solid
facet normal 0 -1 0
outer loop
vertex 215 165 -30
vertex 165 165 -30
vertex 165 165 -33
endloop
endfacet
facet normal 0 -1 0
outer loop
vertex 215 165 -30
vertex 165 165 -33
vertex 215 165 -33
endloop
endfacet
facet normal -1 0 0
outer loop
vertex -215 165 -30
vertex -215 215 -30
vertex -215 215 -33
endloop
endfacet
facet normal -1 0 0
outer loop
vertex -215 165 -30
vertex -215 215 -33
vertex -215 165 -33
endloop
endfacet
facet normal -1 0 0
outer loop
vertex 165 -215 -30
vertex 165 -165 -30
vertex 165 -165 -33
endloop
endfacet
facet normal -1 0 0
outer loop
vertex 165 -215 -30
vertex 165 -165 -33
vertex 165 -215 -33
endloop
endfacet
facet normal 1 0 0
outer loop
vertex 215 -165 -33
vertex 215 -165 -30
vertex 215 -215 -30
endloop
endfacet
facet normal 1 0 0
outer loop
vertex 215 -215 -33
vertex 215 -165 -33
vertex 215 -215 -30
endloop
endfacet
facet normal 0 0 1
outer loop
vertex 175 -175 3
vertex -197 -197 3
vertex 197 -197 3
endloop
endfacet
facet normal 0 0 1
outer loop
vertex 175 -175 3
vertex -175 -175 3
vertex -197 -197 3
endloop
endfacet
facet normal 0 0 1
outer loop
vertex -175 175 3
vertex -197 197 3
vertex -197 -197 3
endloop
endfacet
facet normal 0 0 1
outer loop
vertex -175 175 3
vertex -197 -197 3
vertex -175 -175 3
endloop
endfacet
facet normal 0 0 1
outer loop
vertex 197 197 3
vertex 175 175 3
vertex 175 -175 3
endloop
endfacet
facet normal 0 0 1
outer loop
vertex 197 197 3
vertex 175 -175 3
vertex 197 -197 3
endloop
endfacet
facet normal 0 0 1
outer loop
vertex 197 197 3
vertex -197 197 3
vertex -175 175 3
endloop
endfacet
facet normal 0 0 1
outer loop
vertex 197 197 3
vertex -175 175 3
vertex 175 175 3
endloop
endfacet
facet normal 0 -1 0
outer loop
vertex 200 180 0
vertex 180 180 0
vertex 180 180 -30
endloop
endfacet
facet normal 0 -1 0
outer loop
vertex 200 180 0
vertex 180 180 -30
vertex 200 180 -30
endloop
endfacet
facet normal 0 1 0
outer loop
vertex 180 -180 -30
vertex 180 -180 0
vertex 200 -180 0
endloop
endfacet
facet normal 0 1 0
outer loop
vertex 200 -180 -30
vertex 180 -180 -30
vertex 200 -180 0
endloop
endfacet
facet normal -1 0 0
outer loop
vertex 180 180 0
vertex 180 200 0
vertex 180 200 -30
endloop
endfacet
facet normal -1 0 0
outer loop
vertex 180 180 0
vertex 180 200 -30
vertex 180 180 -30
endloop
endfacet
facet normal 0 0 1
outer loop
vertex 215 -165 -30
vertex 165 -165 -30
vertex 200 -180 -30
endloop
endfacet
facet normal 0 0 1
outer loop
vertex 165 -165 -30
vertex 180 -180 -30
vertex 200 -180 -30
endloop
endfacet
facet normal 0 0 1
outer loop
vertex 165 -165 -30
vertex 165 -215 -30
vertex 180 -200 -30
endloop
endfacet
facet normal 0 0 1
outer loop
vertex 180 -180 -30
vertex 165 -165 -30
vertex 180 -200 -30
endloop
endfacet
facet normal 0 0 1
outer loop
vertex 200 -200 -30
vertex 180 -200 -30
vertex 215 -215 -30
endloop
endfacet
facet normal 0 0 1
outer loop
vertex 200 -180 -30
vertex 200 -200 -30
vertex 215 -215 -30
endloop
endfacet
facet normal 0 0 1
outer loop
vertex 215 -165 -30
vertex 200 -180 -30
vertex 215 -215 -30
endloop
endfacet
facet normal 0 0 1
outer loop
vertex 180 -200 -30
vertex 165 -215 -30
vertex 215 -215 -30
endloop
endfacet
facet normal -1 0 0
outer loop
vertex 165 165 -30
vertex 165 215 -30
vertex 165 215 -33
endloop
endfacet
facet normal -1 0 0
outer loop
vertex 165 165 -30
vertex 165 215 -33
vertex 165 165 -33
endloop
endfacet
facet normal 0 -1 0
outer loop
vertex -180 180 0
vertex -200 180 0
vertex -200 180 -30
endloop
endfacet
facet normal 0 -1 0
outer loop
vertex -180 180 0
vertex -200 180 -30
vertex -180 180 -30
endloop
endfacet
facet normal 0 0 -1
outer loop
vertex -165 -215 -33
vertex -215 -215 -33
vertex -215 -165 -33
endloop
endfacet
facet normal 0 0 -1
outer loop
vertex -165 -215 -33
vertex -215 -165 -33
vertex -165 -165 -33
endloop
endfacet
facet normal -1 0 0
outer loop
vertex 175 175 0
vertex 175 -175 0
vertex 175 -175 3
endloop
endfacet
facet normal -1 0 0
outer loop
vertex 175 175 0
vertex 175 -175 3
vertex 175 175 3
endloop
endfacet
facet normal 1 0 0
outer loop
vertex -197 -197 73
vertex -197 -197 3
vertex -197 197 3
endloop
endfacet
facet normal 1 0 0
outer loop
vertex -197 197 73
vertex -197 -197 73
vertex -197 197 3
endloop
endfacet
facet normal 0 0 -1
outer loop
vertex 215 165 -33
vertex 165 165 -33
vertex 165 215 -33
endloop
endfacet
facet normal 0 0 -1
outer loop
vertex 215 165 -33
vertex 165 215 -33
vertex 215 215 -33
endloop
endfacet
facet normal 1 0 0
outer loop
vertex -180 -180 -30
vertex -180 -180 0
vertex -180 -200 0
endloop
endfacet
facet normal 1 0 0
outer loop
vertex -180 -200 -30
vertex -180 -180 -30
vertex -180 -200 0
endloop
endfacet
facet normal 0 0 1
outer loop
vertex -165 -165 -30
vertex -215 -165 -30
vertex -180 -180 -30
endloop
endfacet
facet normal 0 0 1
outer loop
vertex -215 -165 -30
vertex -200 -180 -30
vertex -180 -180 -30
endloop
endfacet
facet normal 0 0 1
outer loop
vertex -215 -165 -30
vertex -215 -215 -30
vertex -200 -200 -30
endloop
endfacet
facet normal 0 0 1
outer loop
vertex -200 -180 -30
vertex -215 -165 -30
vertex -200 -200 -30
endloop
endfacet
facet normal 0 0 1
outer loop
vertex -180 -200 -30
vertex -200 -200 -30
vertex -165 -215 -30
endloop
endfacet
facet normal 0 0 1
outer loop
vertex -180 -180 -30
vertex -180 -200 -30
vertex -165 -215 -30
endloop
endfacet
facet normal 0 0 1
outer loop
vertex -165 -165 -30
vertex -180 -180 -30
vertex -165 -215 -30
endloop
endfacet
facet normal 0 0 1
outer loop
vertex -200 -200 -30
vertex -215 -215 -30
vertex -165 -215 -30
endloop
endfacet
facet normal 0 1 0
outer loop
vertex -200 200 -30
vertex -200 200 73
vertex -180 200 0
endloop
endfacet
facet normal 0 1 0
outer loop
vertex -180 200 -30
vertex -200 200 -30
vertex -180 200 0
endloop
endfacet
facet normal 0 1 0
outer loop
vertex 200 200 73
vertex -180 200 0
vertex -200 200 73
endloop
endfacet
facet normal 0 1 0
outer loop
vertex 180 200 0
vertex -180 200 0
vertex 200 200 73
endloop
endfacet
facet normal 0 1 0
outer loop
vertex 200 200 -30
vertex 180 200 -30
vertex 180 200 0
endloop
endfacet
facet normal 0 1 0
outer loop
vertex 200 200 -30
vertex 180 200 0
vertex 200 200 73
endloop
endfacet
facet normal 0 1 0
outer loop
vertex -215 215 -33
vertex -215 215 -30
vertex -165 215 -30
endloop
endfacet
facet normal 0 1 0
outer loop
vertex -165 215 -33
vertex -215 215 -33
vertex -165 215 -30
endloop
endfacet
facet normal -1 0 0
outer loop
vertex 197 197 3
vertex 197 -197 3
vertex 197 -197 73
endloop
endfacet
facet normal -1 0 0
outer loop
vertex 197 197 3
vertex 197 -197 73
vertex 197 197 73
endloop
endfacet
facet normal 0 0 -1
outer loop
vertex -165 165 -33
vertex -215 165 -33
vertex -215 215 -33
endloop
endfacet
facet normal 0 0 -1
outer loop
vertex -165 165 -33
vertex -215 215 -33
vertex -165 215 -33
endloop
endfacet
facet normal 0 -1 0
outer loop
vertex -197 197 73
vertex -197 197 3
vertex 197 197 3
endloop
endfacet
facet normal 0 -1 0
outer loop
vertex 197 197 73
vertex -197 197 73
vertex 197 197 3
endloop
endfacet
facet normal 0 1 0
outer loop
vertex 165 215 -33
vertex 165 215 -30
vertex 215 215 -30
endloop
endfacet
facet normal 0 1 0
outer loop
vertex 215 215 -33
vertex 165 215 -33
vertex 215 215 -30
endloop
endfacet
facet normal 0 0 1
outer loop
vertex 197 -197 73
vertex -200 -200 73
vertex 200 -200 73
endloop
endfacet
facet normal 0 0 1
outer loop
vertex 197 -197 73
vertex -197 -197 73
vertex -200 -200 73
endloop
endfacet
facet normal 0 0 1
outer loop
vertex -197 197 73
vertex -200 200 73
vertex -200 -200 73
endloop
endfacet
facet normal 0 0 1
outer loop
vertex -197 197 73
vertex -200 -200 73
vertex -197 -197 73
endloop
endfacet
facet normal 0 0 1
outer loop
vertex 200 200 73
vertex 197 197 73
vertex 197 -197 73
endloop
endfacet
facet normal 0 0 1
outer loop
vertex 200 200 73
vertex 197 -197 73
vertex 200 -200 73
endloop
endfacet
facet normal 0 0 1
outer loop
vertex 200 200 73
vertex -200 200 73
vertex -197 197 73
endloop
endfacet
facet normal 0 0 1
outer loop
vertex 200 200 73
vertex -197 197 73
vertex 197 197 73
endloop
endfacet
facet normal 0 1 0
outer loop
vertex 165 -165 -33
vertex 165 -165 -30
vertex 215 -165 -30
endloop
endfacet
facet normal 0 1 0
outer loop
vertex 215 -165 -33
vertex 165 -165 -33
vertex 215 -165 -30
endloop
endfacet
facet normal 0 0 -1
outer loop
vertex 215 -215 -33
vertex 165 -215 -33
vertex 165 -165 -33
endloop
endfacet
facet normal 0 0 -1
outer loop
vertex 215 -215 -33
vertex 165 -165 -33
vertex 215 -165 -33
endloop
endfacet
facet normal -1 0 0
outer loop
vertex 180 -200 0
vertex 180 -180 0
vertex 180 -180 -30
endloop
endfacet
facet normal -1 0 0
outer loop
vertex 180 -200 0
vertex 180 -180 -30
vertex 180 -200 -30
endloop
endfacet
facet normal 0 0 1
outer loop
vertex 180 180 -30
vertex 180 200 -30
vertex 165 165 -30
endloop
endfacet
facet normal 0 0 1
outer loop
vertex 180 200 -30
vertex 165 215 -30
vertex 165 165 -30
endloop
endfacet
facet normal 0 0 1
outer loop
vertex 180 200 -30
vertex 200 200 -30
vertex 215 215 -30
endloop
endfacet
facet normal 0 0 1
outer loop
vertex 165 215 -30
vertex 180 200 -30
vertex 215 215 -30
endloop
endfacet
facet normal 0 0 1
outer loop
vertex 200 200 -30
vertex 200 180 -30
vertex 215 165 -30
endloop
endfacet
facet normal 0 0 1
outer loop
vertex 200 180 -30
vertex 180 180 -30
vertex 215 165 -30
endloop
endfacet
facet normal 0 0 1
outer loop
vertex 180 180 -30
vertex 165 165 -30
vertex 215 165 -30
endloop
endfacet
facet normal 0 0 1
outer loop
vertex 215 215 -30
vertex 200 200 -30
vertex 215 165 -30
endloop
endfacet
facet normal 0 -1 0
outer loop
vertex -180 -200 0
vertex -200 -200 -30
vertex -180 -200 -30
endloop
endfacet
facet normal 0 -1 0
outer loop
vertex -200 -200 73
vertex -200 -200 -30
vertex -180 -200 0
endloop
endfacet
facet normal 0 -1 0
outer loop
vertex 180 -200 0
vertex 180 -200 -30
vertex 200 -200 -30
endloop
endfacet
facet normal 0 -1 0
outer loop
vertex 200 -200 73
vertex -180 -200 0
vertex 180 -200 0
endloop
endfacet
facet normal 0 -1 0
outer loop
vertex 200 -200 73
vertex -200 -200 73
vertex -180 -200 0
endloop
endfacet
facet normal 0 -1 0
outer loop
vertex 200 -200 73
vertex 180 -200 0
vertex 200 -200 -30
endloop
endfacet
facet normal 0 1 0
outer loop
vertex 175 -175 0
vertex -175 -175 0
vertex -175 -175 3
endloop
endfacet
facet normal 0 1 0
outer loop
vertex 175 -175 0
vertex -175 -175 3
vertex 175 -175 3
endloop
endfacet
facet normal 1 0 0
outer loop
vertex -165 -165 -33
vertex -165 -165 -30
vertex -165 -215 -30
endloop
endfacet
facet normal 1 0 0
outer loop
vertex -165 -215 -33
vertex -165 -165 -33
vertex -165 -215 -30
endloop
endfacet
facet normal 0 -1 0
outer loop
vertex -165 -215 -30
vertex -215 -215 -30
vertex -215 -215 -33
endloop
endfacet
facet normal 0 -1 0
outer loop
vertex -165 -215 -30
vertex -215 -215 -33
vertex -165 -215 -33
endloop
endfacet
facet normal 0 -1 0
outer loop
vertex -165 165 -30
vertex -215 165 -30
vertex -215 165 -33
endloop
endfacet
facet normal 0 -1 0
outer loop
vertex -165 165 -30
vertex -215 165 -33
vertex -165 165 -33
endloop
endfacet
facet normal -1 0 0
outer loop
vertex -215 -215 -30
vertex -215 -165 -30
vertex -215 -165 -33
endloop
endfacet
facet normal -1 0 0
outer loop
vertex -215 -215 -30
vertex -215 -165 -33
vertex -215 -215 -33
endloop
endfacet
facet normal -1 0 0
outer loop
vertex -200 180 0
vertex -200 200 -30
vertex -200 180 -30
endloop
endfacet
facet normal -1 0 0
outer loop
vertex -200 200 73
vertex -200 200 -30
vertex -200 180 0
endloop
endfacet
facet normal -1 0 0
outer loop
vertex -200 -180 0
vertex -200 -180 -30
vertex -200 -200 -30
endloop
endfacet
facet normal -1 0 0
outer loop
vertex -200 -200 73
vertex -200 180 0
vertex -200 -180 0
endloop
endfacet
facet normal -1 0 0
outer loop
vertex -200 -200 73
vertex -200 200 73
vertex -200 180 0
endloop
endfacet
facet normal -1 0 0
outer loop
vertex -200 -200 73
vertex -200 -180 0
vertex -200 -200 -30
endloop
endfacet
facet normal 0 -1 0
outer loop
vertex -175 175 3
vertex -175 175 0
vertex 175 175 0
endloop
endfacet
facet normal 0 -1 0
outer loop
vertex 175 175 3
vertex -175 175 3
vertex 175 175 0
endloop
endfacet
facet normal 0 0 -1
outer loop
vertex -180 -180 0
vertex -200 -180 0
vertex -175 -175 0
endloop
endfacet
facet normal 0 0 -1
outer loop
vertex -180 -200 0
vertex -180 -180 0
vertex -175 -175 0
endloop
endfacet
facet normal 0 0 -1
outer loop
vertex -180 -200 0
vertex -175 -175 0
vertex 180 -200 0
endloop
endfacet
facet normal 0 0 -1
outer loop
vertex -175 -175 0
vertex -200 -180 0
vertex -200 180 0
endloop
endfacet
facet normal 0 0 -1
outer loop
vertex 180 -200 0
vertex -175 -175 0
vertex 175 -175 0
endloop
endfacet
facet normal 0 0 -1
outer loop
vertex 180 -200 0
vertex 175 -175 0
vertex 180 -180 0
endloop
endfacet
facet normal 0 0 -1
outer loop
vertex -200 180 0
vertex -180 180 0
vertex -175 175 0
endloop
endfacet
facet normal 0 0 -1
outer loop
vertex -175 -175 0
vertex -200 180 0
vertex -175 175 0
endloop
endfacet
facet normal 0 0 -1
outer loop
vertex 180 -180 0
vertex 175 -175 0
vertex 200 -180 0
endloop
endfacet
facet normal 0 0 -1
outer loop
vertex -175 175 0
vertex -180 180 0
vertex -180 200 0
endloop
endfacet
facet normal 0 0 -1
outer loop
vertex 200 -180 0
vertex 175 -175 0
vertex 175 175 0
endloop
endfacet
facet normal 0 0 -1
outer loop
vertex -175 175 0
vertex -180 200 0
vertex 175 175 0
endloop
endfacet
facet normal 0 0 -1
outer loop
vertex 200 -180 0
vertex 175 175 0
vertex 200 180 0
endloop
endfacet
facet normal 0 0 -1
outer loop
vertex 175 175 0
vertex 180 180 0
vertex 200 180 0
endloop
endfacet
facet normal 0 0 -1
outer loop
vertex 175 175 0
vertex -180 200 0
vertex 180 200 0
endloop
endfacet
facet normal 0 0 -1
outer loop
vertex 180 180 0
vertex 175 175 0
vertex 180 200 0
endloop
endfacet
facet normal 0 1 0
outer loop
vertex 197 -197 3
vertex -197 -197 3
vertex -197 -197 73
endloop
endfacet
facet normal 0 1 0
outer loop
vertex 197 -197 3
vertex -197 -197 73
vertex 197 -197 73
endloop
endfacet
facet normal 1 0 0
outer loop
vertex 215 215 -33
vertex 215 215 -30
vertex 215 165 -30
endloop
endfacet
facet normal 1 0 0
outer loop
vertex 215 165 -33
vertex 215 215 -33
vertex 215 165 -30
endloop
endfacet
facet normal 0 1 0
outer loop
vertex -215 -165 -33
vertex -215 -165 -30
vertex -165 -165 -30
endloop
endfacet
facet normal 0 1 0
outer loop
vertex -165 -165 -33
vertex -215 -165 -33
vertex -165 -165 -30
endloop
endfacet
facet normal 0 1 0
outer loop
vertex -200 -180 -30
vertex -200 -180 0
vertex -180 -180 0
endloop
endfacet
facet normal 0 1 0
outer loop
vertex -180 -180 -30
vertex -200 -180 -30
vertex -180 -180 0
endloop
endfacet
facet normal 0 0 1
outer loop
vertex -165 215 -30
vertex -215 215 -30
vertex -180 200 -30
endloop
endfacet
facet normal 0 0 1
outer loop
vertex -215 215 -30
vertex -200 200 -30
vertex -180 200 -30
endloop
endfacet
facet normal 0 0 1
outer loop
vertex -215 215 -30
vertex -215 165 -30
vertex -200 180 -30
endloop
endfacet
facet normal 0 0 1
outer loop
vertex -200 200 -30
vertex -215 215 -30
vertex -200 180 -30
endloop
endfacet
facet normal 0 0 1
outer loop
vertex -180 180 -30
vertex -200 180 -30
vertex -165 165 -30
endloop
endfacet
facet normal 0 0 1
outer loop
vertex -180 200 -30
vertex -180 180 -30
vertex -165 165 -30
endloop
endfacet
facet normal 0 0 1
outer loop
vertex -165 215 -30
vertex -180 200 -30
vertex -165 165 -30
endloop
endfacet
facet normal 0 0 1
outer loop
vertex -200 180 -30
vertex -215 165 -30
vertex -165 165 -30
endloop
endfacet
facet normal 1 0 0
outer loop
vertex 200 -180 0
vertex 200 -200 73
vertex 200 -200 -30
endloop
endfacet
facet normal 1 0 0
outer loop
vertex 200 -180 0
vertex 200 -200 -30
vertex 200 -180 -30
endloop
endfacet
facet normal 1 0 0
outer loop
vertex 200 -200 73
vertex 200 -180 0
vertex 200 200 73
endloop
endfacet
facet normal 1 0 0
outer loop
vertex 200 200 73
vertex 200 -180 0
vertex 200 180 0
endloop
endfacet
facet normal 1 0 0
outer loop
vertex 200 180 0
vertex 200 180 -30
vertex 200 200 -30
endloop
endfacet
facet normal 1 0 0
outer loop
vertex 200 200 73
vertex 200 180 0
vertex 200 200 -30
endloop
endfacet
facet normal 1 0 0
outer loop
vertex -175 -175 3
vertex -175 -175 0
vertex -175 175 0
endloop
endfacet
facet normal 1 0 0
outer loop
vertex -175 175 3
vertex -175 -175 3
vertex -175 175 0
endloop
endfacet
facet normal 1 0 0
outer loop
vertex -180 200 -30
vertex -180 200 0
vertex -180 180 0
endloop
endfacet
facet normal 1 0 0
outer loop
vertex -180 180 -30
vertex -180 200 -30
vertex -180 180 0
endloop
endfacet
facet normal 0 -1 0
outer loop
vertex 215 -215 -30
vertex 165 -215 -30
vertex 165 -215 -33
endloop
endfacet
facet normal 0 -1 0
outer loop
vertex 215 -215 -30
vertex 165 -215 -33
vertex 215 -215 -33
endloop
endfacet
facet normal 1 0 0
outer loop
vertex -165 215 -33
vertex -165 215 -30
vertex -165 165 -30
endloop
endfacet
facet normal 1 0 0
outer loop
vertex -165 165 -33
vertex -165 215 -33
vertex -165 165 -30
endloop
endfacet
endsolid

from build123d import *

# Parameters (mm, degrees)
F0_W     = 400
F0_H     = 400
F0_W_2   = 350
F0_H_2   = 350
F1_DEPTH = 3
F2_W     = 400
F2_H     = 400
F2_W_2   = 394
F2_H_2   = 394
F3_DEPTH = 70
F4_W     = 20
F4_H     = 20
F5_DEPTH = 30
F6_W     = 50
F6_H     = 50
F7_DEPTH = 3


with BuildPart() as f1:
    # F0 (on Top) → F1 (new body)
    with BuildSketch(Plane.XY):
        Rectangle(F0_W, F0_H)
        Rectangle(F0_W_2, F0_H_2, mode=Mode.SUBTRACT)
    extrude(amount=F1_DEPTH)

    # F2 (on face) → F3 (join)
    with BuildSketch(Plane.XY.offset(3)):
        Rectangle(F2_W, F2_H)
        Rectangle(F2_W_2, F2_H_2, mode=Mode.SUBTRACT)
    extrude(amount=F3_DEPTH)

    # F4 (on face) → F5 (join)
    with BuildSketch(Plane(origin=(0, 0, 0), x_dir=(1, 0, 0), z_dir=(0, 0, -1))):
        with Locations((-190, 190)):
            Rectangle(F4_W, F4_H)
        with Locations((190, 190)):
            Rectangle(F4_W, F4_H)
        with Locations((-190, -190)):
            Rectangle(F4_W, F4_H)
        with Locations((190, -190)):
            Rectangle(F4_W, F4_H)
    extrude(amount=F5_DEPTH)

    # F6 (on face) → F7 (join)
    with BuildSketch(Plane(origin=(0, 0, -30), x_dir=(1, 0, 0), z_dir=(0, 0, -1))):
        with Locations((-190, 190)):
            Rectangle(F6_W, F6_H)
        with Locations((190, 190)):
            Rectangle(F6_W, F6_H)
        with Locations((190, -190)):
            Rectangle(F6_W, F6_H)
        with Locations((-190, -190)):
            Rectangle(F6_W, F6_H)
    extrude(amount=F7_DEPTH)


solid = f1.part
